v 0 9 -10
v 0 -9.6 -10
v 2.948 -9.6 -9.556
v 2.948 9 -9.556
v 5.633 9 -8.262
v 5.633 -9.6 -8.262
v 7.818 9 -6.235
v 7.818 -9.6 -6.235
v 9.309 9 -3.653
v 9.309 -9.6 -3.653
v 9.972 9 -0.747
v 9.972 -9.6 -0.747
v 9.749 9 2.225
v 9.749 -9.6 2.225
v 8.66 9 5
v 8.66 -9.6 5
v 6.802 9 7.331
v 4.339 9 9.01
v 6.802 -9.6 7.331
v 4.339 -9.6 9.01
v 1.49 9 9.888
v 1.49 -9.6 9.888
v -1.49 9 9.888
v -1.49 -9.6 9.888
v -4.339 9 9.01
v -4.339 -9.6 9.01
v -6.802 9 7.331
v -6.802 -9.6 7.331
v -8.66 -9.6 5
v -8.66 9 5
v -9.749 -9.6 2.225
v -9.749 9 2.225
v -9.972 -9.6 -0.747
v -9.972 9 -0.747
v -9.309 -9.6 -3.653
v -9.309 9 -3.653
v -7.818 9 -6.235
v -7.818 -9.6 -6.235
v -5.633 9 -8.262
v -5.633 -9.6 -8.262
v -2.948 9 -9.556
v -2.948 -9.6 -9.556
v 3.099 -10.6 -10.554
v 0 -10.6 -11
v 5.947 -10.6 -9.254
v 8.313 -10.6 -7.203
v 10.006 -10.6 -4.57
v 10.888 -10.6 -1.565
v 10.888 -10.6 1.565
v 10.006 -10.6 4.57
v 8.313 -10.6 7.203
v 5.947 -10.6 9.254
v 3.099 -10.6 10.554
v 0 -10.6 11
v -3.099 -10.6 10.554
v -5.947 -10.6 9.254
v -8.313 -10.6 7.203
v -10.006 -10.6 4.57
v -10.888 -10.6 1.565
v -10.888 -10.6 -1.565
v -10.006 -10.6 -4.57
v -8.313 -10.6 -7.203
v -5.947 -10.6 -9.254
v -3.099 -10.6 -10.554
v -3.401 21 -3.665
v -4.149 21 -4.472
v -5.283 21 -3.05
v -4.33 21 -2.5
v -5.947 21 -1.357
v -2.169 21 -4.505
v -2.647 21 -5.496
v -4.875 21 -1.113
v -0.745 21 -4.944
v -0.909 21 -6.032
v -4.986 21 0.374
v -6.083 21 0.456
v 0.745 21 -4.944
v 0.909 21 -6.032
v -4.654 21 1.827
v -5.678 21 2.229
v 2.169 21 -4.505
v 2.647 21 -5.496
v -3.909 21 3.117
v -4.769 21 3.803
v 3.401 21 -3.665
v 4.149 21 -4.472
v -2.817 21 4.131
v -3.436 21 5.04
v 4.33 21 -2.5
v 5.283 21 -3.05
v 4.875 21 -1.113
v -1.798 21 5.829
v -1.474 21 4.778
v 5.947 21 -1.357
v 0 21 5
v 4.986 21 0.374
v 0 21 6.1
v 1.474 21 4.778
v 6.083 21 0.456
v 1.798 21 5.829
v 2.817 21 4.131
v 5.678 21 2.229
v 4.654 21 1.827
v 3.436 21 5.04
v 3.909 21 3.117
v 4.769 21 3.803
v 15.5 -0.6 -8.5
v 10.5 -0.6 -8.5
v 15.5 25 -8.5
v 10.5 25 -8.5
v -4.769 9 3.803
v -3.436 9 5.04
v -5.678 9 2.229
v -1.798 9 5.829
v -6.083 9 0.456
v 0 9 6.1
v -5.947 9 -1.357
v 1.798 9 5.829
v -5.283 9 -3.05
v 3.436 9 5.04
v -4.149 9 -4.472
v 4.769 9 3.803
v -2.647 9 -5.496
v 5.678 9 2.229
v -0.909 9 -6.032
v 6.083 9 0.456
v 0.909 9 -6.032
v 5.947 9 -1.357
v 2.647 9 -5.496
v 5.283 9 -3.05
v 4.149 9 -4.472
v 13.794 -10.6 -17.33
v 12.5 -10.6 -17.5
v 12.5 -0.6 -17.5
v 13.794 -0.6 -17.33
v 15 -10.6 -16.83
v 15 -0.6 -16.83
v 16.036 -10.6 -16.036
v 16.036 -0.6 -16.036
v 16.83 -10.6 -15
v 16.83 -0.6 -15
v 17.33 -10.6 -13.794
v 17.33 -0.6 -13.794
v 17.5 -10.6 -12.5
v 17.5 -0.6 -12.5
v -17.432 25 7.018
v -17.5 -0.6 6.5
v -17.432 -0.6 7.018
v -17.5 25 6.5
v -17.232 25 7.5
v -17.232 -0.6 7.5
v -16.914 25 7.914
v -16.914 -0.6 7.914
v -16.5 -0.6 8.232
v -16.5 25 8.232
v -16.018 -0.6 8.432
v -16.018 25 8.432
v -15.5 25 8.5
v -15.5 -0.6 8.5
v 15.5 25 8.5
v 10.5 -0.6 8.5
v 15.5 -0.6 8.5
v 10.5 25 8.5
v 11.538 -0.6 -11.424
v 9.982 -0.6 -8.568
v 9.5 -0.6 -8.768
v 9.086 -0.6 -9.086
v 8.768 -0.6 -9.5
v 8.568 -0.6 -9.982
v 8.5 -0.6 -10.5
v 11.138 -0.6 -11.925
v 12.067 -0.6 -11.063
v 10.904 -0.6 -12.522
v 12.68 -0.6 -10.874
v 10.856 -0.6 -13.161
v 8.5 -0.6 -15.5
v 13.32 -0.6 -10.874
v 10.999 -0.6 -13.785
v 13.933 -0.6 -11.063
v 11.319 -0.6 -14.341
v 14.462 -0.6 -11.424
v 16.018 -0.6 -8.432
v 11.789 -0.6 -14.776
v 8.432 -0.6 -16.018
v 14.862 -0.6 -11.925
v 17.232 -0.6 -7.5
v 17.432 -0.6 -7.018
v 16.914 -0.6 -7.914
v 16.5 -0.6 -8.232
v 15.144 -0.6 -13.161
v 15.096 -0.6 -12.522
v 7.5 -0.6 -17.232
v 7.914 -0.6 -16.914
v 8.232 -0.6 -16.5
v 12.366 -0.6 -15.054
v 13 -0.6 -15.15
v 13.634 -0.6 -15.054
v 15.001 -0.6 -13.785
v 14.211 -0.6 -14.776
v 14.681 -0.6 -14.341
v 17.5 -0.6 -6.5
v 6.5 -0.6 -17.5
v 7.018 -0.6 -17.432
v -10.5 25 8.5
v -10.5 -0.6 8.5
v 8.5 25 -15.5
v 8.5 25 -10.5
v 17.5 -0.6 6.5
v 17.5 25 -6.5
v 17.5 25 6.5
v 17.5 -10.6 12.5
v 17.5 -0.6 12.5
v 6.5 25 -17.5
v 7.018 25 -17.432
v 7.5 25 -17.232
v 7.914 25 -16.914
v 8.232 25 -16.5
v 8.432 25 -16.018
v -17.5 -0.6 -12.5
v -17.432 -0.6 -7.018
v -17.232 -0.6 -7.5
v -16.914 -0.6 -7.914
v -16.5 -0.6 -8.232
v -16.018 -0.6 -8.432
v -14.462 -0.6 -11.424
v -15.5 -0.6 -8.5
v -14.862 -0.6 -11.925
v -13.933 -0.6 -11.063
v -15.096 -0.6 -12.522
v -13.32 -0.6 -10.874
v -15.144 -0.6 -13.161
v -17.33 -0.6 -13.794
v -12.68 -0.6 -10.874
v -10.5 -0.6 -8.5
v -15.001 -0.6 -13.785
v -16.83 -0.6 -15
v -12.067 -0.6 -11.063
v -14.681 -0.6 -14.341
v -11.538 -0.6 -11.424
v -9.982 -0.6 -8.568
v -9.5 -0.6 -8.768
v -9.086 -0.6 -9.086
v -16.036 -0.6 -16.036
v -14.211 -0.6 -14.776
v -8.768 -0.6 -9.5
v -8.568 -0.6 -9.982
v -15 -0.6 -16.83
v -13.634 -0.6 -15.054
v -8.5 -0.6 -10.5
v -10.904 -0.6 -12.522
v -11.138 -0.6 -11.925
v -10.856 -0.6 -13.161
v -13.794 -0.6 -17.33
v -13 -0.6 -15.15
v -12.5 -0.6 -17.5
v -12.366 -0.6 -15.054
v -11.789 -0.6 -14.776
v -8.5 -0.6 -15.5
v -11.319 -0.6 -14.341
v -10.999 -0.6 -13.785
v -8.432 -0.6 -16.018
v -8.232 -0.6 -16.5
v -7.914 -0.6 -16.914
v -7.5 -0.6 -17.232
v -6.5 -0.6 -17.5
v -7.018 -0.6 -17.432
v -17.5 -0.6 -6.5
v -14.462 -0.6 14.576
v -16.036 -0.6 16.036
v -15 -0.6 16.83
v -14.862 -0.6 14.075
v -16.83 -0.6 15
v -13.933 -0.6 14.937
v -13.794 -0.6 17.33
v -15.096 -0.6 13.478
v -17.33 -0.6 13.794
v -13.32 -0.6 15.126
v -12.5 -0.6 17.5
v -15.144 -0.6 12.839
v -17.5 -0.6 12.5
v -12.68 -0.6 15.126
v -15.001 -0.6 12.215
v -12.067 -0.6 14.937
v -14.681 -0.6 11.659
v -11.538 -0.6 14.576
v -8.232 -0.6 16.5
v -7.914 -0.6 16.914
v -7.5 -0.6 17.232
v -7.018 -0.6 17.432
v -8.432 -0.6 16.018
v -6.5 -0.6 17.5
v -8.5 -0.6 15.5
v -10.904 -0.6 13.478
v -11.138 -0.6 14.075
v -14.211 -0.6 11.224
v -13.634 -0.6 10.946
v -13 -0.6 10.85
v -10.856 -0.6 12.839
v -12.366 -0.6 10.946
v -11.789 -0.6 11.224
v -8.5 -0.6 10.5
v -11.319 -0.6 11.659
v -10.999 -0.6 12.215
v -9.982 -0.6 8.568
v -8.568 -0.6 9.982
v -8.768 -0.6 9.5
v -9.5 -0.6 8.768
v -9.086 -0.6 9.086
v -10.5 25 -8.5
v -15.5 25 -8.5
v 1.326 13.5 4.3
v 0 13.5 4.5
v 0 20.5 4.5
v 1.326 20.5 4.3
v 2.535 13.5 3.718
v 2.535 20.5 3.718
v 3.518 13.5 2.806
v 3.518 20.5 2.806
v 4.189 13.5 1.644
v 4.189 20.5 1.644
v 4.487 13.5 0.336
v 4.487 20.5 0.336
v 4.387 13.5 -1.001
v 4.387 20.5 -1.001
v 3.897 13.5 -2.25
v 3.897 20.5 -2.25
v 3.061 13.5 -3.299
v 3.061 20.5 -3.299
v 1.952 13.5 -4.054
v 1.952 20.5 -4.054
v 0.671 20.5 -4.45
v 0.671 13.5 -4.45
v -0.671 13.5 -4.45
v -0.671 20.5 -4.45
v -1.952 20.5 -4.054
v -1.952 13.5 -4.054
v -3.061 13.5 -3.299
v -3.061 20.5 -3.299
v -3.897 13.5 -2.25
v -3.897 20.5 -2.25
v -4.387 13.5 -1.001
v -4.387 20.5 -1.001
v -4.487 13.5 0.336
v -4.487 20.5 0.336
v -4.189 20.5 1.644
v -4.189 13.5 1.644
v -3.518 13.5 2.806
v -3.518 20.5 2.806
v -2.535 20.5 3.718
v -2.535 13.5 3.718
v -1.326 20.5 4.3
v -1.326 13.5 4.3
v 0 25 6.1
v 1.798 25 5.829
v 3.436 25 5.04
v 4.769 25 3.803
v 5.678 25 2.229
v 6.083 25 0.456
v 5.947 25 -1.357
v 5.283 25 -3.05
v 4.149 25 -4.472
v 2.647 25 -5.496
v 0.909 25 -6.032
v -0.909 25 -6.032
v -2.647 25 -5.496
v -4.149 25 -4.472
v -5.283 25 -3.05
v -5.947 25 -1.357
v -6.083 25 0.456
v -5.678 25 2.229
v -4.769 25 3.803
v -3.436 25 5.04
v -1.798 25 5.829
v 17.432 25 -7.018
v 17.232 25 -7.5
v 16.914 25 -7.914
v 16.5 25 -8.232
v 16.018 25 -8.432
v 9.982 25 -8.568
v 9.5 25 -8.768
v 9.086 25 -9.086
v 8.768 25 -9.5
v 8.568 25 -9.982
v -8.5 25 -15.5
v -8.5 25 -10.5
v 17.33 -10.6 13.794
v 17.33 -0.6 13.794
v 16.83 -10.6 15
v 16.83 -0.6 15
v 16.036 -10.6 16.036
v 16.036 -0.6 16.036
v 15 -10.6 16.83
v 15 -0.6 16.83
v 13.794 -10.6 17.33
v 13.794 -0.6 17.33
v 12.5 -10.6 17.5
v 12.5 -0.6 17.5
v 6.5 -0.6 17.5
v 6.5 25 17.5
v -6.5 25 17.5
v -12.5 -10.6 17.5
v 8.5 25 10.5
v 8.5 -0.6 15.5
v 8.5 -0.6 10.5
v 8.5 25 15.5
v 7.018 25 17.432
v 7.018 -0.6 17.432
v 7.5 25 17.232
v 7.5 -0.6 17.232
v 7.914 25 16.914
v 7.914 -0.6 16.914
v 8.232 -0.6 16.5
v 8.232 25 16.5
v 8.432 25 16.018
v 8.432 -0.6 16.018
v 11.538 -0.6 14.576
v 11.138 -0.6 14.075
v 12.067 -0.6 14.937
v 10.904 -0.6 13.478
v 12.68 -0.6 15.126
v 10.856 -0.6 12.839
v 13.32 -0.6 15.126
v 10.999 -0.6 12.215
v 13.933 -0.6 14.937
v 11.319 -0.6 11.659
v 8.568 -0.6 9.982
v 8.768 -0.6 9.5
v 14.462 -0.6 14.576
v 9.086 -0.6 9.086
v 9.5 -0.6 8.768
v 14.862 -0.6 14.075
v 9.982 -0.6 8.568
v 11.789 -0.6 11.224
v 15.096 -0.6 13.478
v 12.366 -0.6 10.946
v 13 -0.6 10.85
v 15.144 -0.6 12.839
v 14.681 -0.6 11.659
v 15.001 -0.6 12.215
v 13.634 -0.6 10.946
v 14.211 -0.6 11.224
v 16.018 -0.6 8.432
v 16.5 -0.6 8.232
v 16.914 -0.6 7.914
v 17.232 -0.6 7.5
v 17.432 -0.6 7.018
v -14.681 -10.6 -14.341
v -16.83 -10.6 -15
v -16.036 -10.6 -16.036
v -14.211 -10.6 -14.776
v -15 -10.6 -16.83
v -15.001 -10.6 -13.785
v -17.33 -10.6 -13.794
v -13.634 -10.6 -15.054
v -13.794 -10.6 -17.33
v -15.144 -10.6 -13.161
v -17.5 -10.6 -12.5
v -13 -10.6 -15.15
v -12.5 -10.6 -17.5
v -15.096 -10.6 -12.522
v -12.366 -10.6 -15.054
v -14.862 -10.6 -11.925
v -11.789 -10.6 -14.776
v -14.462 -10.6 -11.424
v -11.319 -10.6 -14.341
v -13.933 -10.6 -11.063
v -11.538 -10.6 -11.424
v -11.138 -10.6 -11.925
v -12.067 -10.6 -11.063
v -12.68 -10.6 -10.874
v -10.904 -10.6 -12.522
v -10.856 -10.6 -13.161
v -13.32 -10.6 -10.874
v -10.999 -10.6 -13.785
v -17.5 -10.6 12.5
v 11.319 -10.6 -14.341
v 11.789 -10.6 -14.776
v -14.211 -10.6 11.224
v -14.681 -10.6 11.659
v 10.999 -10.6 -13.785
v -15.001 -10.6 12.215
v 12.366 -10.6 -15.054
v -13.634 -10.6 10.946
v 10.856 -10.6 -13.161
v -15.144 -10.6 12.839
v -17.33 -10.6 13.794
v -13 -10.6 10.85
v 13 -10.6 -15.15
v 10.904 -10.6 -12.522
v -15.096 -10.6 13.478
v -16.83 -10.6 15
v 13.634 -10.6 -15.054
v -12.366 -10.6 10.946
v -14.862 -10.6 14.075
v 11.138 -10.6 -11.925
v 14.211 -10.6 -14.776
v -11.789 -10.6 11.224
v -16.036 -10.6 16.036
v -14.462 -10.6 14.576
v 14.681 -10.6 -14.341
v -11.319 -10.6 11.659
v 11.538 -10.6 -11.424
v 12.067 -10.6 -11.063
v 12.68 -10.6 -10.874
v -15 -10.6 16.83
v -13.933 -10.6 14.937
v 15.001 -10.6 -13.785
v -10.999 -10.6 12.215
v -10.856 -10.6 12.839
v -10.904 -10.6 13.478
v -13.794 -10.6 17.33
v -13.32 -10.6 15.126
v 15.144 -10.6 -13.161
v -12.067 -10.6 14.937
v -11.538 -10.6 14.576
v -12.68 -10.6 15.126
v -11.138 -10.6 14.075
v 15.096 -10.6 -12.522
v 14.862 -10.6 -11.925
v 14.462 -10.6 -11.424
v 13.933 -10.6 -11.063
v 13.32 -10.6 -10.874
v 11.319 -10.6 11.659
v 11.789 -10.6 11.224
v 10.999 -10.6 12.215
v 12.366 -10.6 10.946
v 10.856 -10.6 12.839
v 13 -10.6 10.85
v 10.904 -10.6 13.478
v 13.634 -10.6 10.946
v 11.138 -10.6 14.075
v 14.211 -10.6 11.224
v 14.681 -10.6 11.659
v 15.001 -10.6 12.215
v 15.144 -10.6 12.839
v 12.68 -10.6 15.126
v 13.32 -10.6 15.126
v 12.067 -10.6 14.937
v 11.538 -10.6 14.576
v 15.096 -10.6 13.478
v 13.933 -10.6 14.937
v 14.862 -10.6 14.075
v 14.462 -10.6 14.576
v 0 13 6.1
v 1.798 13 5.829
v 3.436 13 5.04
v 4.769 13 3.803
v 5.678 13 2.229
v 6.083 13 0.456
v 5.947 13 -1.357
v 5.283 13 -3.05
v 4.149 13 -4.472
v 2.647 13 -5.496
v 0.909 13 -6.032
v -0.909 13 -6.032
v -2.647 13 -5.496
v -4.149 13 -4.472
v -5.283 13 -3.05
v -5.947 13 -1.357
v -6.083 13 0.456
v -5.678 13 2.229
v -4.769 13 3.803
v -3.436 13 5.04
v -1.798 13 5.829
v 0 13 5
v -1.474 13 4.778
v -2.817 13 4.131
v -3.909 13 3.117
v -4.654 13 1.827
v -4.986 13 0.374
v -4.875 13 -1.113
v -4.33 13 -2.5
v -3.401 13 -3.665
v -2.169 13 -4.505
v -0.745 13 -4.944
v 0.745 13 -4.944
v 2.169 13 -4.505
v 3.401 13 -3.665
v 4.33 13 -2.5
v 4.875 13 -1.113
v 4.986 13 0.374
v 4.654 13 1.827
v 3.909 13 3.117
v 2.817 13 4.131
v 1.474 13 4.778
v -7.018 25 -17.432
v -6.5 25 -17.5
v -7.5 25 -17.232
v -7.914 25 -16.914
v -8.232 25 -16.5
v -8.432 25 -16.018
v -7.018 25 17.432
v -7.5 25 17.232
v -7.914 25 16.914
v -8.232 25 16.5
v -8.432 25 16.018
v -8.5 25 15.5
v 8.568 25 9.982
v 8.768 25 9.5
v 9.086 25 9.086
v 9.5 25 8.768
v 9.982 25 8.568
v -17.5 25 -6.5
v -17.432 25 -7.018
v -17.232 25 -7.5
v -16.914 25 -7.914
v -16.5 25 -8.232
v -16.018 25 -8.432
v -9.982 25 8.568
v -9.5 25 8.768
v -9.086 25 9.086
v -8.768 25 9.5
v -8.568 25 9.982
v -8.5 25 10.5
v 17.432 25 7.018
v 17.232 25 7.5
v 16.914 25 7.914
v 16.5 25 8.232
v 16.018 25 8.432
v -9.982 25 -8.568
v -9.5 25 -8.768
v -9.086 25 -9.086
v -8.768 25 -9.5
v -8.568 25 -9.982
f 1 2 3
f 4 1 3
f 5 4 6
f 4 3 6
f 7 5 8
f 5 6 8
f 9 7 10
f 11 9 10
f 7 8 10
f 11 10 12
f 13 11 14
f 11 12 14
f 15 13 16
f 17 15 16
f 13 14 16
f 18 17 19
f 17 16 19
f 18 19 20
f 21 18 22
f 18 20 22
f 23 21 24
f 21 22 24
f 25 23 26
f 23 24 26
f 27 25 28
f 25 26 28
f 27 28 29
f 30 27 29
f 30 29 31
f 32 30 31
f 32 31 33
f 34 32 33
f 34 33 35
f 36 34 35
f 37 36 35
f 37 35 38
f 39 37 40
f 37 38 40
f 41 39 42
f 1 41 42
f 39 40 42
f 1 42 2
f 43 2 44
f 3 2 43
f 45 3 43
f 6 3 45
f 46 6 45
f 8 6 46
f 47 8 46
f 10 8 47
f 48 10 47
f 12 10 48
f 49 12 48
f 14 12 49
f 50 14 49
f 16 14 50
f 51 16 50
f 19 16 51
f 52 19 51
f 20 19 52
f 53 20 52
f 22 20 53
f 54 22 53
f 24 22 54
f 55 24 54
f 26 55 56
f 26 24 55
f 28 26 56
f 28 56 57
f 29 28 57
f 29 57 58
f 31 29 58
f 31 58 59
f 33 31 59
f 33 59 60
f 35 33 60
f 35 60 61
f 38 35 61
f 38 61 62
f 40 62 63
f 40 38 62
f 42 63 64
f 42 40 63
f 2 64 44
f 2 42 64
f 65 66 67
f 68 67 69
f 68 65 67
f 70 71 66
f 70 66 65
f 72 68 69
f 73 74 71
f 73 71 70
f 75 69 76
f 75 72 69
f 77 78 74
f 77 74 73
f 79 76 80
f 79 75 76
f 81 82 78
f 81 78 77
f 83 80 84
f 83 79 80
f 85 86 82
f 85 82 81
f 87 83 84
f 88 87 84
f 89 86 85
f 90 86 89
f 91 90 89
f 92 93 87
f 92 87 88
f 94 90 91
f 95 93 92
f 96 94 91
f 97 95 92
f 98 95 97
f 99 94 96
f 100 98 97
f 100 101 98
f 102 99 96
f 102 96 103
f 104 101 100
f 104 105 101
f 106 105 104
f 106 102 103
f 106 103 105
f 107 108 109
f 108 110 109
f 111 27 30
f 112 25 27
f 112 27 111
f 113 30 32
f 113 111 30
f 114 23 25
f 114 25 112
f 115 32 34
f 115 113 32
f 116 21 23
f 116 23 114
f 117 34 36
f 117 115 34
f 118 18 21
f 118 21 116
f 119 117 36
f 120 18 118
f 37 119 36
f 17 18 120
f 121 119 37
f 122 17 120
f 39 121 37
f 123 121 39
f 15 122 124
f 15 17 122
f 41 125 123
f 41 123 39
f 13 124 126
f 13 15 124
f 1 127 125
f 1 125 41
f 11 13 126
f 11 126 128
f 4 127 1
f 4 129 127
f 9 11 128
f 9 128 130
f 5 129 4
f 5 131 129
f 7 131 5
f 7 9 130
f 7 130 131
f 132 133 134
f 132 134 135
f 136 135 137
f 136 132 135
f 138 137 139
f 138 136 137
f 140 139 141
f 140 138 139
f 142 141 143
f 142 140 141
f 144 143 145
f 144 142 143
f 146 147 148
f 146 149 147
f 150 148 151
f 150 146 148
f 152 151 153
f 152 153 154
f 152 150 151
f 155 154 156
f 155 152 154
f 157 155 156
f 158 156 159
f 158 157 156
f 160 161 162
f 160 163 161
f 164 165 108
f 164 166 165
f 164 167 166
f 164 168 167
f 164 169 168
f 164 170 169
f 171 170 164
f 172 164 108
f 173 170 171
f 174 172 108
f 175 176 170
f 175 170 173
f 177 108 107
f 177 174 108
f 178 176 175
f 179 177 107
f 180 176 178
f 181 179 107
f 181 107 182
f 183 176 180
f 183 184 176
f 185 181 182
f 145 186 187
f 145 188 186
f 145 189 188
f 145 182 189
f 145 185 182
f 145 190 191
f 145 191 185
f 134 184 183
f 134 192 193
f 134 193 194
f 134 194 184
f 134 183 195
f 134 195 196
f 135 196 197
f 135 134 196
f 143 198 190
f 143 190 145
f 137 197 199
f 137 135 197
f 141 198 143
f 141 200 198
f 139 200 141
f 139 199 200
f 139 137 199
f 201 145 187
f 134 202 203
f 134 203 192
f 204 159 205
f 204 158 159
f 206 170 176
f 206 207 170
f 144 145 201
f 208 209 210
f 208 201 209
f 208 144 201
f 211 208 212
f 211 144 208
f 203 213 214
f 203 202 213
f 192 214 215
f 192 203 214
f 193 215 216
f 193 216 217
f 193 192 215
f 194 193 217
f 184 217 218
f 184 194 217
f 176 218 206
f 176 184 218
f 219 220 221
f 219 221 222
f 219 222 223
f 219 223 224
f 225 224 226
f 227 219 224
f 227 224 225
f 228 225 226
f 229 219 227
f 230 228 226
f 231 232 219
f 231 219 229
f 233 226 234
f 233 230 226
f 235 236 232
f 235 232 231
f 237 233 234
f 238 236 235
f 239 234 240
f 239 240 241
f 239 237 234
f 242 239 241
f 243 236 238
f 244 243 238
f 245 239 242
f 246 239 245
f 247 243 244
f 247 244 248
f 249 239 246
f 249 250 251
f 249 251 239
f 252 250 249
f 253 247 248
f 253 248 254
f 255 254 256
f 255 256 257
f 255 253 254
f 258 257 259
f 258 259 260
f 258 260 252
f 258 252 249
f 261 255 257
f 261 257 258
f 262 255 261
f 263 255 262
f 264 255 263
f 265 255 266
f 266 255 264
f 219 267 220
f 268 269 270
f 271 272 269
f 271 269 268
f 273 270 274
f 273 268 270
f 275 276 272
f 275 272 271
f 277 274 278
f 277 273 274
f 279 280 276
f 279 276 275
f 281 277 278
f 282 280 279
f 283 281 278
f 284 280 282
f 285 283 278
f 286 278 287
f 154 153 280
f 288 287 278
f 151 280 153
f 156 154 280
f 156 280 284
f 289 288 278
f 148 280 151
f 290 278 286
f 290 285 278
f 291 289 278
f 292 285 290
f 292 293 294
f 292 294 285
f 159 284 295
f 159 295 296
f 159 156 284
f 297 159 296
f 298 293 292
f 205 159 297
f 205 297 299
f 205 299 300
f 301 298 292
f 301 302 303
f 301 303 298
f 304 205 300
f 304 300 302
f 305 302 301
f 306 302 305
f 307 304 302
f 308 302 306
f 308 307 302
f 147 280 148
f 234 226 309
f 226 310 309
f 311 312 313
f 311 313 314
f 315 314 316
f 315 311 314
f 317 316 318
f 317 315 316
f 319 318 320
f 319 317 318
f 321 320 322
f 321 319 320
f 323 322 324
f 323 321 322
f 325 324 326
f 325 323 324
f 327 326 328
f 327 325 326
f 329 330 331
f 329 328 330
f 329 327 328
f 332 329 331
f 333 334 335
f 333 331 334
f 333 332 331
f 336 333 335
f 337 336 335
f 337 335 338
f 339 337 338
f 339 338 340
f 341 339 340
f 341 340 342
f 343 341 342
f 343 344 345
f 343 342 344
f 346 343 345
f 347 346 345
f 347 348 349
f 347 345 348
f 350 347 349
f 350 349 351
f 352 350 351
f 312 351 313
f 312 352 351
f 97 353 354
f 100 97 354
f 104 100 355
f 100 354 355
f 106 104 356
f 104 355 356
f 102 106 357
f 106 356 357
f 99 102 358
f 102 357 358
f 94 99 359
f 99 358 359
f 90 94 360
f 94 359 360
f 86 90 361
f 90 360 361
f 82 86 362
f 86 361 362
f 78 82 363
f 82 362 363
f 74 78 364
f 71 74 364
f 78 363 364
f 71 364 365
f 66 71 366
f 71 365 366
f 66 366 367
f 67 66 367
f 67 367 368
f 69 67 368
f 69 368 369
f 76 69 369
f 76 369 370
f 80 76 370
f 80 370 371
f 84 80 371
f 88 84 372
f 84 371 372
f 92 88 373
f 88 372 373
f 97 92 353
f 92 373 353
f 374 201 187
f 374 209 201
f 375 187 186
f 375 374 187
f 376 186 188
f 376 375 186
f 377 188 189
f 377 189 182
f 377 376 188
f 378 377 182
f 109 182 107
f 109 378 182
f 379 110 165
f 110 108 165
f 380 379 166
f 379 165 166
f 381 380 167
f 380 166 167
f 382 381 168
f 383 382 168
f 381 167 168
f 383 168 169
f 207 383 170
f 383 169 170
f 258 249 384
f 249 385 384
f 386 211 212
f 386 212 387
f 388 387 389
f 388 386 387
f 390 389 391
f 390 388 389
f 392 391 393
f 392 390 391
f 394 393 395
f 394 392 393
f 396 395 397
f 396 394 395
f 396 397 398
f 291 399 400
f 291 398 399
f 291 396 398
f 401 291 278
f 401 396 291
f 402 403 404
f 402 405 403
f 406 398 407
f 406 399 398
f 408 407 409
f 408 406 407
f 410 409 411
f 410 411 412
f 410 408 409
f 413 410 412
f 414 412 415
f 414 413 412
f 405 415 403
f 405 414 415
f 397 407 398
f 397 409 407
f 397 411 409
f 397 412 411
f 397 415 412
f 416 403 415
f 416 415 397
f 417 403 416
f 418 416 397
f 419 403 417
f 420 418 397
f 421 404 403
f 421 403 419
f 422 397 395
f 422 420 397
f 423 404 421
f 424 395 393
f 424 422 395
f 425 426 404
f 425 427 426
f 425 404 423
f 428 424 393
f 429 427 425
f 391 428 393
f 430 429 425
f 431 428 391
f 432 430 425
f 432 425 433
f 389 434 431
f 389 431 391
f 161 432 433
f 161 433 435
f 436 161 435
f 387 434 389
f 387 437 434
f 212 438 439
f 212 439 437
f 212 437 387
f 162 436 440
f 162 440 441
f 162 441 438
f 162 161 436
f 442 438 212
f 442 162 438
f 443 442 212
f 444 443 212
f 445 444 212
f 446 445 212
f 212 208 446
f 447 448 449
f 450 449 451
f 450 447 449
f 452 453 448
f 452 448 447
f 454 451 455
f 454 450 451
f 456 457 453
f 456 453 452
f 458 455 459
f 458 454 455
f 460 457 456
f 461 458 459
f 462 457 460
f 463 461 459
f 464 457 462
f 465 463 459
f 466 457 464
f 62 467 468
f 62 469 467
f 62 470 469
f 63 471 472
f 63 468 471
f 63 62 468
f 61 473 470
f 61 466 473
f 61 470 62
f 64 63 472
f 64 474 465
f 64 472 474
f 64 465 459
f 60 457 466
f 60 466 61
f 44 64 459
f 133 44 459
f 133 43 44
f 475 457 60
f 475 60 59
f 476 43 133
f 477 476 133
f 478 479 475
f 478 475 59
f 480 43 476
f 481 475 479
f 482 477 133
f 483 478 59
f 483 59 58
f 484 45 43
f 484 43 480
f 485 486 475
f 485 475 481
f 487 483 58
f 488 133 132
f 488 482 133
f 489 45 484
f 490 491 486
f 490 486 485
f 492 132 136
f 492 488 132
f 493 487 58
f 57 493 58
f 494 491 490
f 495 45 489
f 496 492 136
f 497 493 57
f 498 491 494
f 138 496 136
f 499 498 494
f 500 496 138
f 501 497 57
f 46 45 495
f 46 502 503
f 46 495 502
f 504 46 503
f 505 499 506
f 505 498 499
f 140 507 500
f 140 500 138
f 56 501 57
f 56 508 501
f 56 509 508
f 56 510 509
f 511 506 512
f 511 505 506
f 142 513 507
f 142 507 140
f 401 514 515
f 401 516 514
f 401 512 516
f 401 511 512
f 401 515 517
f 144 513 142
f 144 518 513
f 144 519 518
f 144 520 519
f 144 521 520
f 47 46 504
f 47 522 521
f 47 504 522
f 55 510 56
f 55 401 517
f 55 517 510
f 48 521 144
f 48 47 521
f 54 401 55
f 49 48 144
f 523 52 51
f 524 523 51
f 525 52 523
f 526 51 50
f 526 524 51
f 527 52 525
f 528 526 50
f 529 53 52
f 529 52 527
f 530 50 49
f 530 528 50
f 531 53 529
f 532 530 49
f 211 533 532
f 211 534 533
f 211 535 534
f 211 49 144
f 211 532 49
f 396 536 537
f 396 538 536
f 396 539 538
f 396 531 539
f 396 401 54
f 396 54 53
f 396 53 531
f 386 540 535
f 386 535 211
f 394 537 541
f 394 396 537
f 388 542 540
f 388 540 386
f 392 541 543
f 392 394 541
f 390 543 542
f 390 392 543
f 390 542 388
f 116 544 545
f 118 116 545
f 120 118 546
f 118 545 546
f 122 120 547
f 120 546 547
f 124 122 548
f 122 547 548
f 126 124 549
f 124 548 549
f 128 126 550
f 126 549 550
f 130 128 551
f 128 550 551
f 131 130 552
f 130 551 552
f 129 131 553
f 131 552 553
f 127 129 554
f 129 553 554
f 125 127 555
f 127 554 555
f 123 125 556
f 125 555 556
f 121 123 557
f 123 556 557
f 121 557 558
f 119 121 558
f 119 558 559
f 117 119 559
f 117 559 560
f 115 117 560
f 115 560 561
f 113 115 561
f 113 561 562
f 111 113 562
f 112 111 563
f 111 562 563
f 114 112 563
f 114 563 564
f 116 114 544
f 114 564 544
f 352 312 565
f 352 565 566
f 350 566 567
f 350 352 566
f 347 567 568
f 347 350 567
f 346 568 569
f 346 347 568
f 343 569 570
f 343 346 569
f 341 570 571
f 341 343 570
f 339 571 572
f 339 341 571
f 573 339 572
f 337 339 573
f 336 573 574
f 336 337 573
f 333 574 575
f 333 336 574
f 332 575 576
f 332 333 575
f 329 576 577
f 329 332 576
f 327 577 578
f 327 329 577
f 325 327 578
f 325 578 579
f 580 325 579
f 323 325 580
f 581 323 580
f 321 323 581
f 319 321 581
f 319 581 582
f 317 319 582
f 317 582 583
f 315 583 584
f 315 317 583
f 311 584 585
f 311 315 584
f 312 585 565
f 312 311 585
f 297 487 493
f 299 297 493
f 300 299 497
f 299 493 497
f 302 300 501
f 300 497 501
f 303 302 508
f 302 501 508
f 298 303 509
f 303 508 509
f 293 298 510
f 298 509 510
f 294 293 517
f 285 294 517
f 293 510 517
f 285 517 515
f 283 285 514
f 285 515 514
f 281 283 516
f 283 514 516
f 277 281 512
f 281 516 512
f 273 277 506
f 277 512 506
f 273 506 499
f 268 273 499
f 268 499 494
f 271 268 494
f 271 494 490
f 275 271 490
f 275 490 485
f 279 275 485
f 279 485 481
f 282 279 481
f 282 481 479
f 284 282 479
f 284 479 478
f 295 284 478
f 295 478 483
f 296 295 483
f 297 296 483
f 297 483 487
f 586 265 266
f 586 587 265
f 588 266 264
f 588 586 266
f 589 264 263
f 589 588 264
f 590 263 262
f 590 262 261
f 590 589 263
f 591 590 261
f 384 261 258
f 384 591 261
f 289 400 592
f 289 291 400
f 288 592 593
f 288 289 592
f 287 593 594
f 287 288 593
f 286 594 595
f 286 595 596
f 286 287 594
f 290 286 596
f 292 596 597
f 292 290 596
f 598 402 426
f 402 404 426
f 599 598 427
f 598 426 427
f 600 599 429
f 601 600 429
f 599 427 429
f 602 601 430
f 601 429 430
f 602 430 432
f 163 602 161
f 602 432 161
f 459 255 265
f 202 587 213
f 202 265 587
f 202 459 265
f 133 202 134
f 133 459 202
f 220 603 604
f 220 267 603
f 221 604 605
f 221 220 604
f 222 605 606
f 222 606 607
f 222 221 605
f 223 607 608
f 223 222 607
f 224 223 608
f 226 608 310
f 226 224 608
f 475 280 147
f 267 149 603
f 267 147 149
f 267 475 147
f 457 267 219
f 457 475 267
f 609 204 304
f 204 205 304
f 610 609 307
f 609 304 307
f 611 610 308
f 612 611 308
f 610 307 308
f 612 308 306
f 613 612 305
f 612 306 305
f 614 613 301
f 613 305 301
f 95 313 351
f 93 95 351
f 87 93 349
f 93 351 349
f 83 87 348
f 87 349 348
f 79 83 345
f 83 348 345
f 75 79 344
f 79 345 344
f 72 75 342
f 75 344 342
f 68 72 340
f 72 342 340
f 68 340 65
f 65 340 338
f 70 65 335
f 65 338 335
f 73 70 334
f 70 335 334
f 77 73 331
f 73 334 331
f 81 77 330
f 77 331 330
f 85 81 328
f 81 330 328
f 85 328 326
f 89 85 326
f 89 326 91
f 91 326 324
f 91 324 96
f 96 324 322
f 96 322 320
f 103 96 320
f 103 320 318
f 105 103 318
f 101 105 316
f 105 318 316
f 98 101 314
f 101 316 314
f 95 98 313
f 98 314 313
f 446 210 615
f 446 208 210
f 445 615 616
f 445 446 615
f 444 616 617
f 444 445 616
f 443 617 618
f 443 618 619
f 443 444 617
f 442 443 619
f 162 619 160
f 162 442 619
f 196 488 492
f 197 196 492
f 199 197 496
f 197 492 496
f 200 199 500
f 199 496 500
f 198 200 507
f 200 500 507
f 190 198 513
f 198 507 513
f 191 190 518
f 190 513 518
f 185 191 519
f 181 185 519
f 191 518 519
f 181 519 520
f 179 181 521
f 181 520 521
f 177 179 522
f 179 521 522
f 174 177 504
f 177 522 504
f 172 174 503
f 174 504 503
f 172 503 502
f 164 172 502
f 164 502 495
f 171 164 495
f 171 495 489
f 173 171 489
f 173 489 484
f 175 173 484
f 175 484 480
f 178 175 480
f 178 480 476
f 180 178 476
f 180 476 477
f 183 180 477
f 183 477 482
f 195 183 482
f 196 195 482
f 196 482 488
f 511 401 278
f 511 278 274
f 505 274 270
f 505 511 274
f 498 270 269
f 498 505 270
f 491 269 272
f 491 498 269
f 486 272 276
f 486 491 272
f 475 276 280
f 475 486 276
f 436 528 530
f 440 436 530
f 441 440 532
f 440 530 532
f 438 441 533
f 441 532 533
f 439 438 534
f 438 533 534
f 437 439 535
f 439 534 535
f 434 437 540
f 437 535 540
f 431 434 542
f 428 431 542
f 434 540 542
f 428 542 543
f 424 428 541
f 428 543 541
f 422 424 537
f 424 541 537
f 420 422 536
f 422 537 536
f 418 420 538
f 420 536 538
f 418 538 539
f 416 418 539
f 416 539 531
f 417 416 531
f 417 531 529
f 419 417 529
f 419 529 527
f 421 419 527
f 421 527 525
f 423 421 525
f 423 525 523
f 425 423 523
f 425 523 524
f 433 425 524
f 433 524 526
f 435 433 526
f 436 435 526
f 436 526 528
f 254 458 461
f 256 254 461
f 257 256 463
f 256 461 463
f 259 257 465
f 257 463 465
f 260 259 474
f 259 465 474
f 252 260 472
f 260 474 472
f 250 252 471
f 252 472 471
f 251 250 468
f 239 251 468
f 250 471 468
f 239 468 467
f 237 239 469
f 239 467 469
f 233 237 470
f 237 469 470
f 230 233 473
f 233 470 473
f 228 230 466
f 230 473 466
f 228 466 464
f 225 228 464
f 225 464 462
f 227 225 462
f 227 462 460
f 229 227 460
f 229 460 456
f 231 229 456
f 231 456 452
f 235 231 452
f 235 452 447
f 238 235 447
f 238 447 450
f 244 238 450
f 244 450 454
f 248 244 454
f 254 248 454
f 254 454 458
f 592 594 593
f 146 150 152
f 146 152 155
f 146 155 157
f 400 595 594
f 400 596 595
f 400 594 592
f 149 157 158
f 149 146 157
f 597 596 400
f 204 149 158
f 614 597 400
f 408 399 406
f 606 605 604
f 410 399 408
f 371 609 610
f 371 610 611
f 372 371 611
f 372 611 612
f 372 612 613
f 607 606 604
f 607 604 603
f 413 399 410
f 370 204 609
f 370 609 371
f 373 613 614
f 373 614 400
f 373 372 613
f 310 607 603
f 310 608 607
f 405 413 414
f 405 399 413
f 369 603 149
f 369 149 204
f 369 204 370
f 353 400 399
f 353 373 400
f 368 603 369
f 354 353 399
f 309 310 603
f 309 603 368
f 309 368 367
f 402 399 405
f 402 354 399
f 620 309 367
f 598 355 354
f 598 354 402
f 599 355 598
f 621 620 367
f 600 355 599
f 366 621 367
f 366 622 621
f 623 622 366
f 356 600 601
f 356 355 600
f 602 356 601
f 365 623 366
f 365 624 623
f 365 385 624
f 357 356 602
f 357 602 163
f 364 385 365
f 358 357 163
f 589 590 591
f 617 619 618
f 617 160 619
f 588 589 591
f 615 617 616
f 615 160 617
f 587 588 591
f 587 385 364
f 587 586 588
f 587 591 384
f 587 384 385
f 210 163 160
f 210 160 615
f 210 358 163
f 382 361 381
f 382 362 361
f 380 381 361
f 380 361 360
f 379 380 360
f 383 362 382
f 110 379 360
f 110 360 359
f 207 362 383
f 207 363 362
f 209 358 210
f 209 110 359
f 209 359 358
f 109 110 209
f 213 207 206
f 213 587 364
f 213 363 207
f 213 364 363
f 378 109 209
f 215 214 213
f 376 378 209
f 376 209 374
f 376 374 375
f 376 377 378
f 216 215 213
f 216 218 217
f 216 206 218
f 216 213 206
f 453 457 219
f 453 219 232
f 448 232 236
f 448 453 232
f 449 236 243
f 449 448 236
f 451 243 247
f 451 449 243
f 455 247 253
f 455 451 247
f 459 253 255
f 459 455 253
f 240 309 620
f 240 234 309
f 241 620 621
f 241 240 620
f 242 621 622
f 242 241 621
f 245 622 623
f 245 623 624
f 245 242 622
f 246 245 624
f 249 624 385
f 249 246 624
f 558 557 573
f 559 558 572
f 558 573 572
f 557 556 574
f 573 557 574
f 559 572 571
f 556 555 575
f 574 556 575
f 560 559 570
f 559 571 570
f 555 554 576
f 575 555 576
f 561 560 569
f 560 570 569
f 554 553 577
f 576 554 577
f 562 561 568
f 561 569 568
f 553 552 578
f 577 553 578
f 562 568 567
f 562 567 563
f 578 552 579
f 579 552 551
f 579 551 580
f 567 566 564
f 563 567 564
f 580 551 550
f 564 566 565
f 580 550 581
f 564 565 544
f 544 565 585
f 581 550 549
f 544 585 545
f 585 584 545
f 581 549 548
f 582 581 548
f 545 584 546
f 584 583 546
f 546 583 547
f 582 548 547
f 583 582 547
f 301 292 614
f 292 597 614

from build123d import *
from build123d.topology import SkipClean

# Parameters (mm, degrees)
SKETCH_1_W          = 35
SKETCH_1_H          = 35
SKETCH_1_R          = 4.5
SKETCH_1_R_2        = 2.15
EXTRUDE_1_DEPTH     = 25
FILLET_1_R          = 5
SKETCH_3_R          = 6.1
CUT_EXTRUDE_1_DEPTH = 4
SKETCH_4_R          = 6.1
CUT_EXTRUDE_2_DEPTH = 4
SKETCH_6_R          = 10
CUT_EXTRUDE_3_DEPTH = 9
EXTRUDE_START       = 10.6
SKETCH_7_R          = 2.15
SKETCH_7_R_2        = 10
EXTRUDE_2_DEPTH     = 10.6
SKETCH_8_W          = 9
SKETCH_8_H          = 9
CUT_EXTRUDE_4_DEPTH = 25.6
FILLET_2_R          = 2
CHAMFER_1_SIZE      = 1
CHAMFER_2_SIZE      = 0.5


with BuildPart() as part:
    # 草图1 → 凸台-拉伸1 (new body)
    with BuildSketch(Plane(origin=(0, 0, 0), x_dir=(1, 0, 0), z_dir=(0, 1, 0))):
        Rectangle(SKETCH_1_W, SKETCH_1_H)
        with Locations(Location((0, 0, 0), (0, 0, 270))):
            Circle(SKETCH_1_R, mode=Mode.SUBTRACT)
        with Locations(Location((13, 13, 0), (0, 0, 270))):
            Circle(SKETCH_1_R_2, mode=Mode.SUBTRACT)
        with Locations(Location((13, -13, 0), (0, 0, 270))):
            Circle(SKETCH_1_R_2, mode=Mode.SUBTRACT)
        with Locations(Location((-13, -13, 0), (0, 0, 270))):
            Circle(SKETCH_1_R_2, mode=Mode.SUBTRACT)
        with Locations(Location((-13, 13, 0), (0, 0, 270))):
            Circle(SKETCH_1_R_2, mode=Mode.SUBTRACT)
    extrude(amount=EXTRUDE_1_DEPTH)

    # 圆角1
    fillet_1_edges = [part.edges().sort_by_distance(p)[0] for p in [
        (17.5, 12.5, 17.5),
        (-17.5, 12.5, 17.5),
        (-17.5, 12.5, -17.5),
        (17.5, 12.5, -17.5),
    ]]
    fillet(fillet_1_edges, radius=FILLET_1_R)

    # 草图3 → 切除-拉伸1 (cut)
    with BuildSketch(Plane(origin=(0, 25, 0), x_dir=(1, 0, 0), z_dir=(0, 1, 0))):
        with Locations(Location((0, 0, 0), (0, 0, 270))):
            Circle(SKETCH_3_R)
    extrude(amount=-CUT_EXTRUDE_1_DEPTH, mode=Mode.SUBTRACT)

    # 草图4 → 切除-拉伸2 (cut)
    with BuildSketch(Plane(origin=(0, 13, 0), x_dir=(1, 0, 0), z_dir=(0, 1, 0))):
        with Locations(Location((0, 0, 0), (0, 0, 270))):
            Circle(SKETCH_4_R)
    extrude(amount=-CUT_EXTRUDE_2_DEPTH, mode=Mode.SUBTRACT)

    # 草图6 → 切除-拉伸3 (cut)
    with BuildSketch(Plane.XZ):
        with Locations(Location((0, 0, 0), (0, 0, 270))):
            Circle(SKETCH_6_R)
    extrude(amount=-CUT_EXTRUDE_3_DEPTH, mode=Mode.SUBTRACT)

    # 草图7 → 凸台-拉伸2 (add)
    with SkipClean():  # the faces are left unmerged after this step: merging them gives an invalid solid
        with BuildSketch(Plane.XZ.offset(EXTRUDE_START)):
            with BuildLine():
                Line((-12.5, -17.5), (12.5, -17.5))
                ThreePointArc((12.5, -17.5), (16.035533906, -16.035533906), (17.5, -12.5))
                Line((17.5, -12.5), (17.5, 12.5))
                ThreePointArc((17.5, 12.5), (16.035533906, 16.035533906), (12.5, 17.5))
                Line((12.5, 17.5), (-12.5, 17.5))
                ThreePointArc((-12.5, 17.5), (-16.035533906, 16.035533906), (-17.5, 12.5))
                Line((-17.5, 12.5), (-17.5, -12.5))
                ThreePointArc((-17.5, -12.5), (-16.035533906, -16.035533906), (-12.5, -17.5))
            make_face()
            with Locations(Location((-13, -13, 0), (0, 0, 270))):
                Circle(SKETCH_7_R, mode=Mode.SUBTRACT)
            with Locations(Location((-13, 13, 0), (0, 0, 270))):
                Circle(SKETCH_7_R, mode=Mode.SUBTRACT)
            with Locations(Location((0, 0, 0), (0, 0, 270))):
                Circle(SKETCH_7_R_2, mode=Mode.SUBTRACT)
            with Locations(Location((13, -13, 0), (0, 0, 270))):
                Circle(SKETCH_7_R, mode=Mode.SUBTRACT)
            with Locations(Location((13, 13, 0), (0, 0, 270))):
                Circle(SKETCH_7_R, mode=Mode.SUBTRACT)
        extrude(amount=-EXTRUDE_2_DEPTH)

    # 草图8 → 切除-拉伸4 (cut)
    with BuildSketch(Plane(origin=(0, 25, 0), x_dir=(1, 0, 0), z_dir=(0, 1, 0))):
        with Locations((-13, 13)):
            Rectangle(SKETCH_8_W, SKETCH_8_H)
        with Locations((13, 13)):
            Rectangle(SKETCH_8_W, SKETCH_8_H)
        with Locations((13, -13)):
            Rectangle(SKETCH_8_W, SKETCH_8_H)
        with Locations((-13, -13)):
            Rectangle(SKETCH_8_W, SKETCH_8_H)
    extrude(amount=-CUT_EXTRUDE_4_DEPTH, mode=Mode.SUBTRACT)

    # 圆角2
    fillet_2_edges = [part.edges().sort_by_distance(p)[0] for p in [
        (-17.5, 12.2, 8.5),
        (-8.5, 12.2, 8.5),
        (-8.5, 12.2, 17.5),
        (8.5, 12.2, 17.5),
        (8.5, 12.2, 8.5),
        (17.5, 12.2, 8.5),
        (17.5, 12.2, -8.5),
        (8.5, 12.2, -8.5),
        (8.5, 12.2, -17.5),
        (-17.5, 12.2, -8.5),
        (-8.5, 12.2, -17.5),
        (-8.5, 12.2, -8.5),
    ]]
    fillet(fillet_2_edges, radius=FILLET_2_R)

    # 倒角1
    chamfer_1_edges = [part.edges().sort_by_distance(p)[0] for p in [
        (0, -10.6, 10),
    ]]
    chamfer(chamfer_1_edges, length=CHAMFER_1_SIZE)

    # 倒角2
    chamfer_2_edges = [part.edges().sort_by_distance(p)[0] for p in [
        (0, 21, -4.5),
        (0, 13, -4.5),
    ]]
    chamfer(chamfer_2_edges, length=CHAMFER_2_SIZE)


solid = part.part
